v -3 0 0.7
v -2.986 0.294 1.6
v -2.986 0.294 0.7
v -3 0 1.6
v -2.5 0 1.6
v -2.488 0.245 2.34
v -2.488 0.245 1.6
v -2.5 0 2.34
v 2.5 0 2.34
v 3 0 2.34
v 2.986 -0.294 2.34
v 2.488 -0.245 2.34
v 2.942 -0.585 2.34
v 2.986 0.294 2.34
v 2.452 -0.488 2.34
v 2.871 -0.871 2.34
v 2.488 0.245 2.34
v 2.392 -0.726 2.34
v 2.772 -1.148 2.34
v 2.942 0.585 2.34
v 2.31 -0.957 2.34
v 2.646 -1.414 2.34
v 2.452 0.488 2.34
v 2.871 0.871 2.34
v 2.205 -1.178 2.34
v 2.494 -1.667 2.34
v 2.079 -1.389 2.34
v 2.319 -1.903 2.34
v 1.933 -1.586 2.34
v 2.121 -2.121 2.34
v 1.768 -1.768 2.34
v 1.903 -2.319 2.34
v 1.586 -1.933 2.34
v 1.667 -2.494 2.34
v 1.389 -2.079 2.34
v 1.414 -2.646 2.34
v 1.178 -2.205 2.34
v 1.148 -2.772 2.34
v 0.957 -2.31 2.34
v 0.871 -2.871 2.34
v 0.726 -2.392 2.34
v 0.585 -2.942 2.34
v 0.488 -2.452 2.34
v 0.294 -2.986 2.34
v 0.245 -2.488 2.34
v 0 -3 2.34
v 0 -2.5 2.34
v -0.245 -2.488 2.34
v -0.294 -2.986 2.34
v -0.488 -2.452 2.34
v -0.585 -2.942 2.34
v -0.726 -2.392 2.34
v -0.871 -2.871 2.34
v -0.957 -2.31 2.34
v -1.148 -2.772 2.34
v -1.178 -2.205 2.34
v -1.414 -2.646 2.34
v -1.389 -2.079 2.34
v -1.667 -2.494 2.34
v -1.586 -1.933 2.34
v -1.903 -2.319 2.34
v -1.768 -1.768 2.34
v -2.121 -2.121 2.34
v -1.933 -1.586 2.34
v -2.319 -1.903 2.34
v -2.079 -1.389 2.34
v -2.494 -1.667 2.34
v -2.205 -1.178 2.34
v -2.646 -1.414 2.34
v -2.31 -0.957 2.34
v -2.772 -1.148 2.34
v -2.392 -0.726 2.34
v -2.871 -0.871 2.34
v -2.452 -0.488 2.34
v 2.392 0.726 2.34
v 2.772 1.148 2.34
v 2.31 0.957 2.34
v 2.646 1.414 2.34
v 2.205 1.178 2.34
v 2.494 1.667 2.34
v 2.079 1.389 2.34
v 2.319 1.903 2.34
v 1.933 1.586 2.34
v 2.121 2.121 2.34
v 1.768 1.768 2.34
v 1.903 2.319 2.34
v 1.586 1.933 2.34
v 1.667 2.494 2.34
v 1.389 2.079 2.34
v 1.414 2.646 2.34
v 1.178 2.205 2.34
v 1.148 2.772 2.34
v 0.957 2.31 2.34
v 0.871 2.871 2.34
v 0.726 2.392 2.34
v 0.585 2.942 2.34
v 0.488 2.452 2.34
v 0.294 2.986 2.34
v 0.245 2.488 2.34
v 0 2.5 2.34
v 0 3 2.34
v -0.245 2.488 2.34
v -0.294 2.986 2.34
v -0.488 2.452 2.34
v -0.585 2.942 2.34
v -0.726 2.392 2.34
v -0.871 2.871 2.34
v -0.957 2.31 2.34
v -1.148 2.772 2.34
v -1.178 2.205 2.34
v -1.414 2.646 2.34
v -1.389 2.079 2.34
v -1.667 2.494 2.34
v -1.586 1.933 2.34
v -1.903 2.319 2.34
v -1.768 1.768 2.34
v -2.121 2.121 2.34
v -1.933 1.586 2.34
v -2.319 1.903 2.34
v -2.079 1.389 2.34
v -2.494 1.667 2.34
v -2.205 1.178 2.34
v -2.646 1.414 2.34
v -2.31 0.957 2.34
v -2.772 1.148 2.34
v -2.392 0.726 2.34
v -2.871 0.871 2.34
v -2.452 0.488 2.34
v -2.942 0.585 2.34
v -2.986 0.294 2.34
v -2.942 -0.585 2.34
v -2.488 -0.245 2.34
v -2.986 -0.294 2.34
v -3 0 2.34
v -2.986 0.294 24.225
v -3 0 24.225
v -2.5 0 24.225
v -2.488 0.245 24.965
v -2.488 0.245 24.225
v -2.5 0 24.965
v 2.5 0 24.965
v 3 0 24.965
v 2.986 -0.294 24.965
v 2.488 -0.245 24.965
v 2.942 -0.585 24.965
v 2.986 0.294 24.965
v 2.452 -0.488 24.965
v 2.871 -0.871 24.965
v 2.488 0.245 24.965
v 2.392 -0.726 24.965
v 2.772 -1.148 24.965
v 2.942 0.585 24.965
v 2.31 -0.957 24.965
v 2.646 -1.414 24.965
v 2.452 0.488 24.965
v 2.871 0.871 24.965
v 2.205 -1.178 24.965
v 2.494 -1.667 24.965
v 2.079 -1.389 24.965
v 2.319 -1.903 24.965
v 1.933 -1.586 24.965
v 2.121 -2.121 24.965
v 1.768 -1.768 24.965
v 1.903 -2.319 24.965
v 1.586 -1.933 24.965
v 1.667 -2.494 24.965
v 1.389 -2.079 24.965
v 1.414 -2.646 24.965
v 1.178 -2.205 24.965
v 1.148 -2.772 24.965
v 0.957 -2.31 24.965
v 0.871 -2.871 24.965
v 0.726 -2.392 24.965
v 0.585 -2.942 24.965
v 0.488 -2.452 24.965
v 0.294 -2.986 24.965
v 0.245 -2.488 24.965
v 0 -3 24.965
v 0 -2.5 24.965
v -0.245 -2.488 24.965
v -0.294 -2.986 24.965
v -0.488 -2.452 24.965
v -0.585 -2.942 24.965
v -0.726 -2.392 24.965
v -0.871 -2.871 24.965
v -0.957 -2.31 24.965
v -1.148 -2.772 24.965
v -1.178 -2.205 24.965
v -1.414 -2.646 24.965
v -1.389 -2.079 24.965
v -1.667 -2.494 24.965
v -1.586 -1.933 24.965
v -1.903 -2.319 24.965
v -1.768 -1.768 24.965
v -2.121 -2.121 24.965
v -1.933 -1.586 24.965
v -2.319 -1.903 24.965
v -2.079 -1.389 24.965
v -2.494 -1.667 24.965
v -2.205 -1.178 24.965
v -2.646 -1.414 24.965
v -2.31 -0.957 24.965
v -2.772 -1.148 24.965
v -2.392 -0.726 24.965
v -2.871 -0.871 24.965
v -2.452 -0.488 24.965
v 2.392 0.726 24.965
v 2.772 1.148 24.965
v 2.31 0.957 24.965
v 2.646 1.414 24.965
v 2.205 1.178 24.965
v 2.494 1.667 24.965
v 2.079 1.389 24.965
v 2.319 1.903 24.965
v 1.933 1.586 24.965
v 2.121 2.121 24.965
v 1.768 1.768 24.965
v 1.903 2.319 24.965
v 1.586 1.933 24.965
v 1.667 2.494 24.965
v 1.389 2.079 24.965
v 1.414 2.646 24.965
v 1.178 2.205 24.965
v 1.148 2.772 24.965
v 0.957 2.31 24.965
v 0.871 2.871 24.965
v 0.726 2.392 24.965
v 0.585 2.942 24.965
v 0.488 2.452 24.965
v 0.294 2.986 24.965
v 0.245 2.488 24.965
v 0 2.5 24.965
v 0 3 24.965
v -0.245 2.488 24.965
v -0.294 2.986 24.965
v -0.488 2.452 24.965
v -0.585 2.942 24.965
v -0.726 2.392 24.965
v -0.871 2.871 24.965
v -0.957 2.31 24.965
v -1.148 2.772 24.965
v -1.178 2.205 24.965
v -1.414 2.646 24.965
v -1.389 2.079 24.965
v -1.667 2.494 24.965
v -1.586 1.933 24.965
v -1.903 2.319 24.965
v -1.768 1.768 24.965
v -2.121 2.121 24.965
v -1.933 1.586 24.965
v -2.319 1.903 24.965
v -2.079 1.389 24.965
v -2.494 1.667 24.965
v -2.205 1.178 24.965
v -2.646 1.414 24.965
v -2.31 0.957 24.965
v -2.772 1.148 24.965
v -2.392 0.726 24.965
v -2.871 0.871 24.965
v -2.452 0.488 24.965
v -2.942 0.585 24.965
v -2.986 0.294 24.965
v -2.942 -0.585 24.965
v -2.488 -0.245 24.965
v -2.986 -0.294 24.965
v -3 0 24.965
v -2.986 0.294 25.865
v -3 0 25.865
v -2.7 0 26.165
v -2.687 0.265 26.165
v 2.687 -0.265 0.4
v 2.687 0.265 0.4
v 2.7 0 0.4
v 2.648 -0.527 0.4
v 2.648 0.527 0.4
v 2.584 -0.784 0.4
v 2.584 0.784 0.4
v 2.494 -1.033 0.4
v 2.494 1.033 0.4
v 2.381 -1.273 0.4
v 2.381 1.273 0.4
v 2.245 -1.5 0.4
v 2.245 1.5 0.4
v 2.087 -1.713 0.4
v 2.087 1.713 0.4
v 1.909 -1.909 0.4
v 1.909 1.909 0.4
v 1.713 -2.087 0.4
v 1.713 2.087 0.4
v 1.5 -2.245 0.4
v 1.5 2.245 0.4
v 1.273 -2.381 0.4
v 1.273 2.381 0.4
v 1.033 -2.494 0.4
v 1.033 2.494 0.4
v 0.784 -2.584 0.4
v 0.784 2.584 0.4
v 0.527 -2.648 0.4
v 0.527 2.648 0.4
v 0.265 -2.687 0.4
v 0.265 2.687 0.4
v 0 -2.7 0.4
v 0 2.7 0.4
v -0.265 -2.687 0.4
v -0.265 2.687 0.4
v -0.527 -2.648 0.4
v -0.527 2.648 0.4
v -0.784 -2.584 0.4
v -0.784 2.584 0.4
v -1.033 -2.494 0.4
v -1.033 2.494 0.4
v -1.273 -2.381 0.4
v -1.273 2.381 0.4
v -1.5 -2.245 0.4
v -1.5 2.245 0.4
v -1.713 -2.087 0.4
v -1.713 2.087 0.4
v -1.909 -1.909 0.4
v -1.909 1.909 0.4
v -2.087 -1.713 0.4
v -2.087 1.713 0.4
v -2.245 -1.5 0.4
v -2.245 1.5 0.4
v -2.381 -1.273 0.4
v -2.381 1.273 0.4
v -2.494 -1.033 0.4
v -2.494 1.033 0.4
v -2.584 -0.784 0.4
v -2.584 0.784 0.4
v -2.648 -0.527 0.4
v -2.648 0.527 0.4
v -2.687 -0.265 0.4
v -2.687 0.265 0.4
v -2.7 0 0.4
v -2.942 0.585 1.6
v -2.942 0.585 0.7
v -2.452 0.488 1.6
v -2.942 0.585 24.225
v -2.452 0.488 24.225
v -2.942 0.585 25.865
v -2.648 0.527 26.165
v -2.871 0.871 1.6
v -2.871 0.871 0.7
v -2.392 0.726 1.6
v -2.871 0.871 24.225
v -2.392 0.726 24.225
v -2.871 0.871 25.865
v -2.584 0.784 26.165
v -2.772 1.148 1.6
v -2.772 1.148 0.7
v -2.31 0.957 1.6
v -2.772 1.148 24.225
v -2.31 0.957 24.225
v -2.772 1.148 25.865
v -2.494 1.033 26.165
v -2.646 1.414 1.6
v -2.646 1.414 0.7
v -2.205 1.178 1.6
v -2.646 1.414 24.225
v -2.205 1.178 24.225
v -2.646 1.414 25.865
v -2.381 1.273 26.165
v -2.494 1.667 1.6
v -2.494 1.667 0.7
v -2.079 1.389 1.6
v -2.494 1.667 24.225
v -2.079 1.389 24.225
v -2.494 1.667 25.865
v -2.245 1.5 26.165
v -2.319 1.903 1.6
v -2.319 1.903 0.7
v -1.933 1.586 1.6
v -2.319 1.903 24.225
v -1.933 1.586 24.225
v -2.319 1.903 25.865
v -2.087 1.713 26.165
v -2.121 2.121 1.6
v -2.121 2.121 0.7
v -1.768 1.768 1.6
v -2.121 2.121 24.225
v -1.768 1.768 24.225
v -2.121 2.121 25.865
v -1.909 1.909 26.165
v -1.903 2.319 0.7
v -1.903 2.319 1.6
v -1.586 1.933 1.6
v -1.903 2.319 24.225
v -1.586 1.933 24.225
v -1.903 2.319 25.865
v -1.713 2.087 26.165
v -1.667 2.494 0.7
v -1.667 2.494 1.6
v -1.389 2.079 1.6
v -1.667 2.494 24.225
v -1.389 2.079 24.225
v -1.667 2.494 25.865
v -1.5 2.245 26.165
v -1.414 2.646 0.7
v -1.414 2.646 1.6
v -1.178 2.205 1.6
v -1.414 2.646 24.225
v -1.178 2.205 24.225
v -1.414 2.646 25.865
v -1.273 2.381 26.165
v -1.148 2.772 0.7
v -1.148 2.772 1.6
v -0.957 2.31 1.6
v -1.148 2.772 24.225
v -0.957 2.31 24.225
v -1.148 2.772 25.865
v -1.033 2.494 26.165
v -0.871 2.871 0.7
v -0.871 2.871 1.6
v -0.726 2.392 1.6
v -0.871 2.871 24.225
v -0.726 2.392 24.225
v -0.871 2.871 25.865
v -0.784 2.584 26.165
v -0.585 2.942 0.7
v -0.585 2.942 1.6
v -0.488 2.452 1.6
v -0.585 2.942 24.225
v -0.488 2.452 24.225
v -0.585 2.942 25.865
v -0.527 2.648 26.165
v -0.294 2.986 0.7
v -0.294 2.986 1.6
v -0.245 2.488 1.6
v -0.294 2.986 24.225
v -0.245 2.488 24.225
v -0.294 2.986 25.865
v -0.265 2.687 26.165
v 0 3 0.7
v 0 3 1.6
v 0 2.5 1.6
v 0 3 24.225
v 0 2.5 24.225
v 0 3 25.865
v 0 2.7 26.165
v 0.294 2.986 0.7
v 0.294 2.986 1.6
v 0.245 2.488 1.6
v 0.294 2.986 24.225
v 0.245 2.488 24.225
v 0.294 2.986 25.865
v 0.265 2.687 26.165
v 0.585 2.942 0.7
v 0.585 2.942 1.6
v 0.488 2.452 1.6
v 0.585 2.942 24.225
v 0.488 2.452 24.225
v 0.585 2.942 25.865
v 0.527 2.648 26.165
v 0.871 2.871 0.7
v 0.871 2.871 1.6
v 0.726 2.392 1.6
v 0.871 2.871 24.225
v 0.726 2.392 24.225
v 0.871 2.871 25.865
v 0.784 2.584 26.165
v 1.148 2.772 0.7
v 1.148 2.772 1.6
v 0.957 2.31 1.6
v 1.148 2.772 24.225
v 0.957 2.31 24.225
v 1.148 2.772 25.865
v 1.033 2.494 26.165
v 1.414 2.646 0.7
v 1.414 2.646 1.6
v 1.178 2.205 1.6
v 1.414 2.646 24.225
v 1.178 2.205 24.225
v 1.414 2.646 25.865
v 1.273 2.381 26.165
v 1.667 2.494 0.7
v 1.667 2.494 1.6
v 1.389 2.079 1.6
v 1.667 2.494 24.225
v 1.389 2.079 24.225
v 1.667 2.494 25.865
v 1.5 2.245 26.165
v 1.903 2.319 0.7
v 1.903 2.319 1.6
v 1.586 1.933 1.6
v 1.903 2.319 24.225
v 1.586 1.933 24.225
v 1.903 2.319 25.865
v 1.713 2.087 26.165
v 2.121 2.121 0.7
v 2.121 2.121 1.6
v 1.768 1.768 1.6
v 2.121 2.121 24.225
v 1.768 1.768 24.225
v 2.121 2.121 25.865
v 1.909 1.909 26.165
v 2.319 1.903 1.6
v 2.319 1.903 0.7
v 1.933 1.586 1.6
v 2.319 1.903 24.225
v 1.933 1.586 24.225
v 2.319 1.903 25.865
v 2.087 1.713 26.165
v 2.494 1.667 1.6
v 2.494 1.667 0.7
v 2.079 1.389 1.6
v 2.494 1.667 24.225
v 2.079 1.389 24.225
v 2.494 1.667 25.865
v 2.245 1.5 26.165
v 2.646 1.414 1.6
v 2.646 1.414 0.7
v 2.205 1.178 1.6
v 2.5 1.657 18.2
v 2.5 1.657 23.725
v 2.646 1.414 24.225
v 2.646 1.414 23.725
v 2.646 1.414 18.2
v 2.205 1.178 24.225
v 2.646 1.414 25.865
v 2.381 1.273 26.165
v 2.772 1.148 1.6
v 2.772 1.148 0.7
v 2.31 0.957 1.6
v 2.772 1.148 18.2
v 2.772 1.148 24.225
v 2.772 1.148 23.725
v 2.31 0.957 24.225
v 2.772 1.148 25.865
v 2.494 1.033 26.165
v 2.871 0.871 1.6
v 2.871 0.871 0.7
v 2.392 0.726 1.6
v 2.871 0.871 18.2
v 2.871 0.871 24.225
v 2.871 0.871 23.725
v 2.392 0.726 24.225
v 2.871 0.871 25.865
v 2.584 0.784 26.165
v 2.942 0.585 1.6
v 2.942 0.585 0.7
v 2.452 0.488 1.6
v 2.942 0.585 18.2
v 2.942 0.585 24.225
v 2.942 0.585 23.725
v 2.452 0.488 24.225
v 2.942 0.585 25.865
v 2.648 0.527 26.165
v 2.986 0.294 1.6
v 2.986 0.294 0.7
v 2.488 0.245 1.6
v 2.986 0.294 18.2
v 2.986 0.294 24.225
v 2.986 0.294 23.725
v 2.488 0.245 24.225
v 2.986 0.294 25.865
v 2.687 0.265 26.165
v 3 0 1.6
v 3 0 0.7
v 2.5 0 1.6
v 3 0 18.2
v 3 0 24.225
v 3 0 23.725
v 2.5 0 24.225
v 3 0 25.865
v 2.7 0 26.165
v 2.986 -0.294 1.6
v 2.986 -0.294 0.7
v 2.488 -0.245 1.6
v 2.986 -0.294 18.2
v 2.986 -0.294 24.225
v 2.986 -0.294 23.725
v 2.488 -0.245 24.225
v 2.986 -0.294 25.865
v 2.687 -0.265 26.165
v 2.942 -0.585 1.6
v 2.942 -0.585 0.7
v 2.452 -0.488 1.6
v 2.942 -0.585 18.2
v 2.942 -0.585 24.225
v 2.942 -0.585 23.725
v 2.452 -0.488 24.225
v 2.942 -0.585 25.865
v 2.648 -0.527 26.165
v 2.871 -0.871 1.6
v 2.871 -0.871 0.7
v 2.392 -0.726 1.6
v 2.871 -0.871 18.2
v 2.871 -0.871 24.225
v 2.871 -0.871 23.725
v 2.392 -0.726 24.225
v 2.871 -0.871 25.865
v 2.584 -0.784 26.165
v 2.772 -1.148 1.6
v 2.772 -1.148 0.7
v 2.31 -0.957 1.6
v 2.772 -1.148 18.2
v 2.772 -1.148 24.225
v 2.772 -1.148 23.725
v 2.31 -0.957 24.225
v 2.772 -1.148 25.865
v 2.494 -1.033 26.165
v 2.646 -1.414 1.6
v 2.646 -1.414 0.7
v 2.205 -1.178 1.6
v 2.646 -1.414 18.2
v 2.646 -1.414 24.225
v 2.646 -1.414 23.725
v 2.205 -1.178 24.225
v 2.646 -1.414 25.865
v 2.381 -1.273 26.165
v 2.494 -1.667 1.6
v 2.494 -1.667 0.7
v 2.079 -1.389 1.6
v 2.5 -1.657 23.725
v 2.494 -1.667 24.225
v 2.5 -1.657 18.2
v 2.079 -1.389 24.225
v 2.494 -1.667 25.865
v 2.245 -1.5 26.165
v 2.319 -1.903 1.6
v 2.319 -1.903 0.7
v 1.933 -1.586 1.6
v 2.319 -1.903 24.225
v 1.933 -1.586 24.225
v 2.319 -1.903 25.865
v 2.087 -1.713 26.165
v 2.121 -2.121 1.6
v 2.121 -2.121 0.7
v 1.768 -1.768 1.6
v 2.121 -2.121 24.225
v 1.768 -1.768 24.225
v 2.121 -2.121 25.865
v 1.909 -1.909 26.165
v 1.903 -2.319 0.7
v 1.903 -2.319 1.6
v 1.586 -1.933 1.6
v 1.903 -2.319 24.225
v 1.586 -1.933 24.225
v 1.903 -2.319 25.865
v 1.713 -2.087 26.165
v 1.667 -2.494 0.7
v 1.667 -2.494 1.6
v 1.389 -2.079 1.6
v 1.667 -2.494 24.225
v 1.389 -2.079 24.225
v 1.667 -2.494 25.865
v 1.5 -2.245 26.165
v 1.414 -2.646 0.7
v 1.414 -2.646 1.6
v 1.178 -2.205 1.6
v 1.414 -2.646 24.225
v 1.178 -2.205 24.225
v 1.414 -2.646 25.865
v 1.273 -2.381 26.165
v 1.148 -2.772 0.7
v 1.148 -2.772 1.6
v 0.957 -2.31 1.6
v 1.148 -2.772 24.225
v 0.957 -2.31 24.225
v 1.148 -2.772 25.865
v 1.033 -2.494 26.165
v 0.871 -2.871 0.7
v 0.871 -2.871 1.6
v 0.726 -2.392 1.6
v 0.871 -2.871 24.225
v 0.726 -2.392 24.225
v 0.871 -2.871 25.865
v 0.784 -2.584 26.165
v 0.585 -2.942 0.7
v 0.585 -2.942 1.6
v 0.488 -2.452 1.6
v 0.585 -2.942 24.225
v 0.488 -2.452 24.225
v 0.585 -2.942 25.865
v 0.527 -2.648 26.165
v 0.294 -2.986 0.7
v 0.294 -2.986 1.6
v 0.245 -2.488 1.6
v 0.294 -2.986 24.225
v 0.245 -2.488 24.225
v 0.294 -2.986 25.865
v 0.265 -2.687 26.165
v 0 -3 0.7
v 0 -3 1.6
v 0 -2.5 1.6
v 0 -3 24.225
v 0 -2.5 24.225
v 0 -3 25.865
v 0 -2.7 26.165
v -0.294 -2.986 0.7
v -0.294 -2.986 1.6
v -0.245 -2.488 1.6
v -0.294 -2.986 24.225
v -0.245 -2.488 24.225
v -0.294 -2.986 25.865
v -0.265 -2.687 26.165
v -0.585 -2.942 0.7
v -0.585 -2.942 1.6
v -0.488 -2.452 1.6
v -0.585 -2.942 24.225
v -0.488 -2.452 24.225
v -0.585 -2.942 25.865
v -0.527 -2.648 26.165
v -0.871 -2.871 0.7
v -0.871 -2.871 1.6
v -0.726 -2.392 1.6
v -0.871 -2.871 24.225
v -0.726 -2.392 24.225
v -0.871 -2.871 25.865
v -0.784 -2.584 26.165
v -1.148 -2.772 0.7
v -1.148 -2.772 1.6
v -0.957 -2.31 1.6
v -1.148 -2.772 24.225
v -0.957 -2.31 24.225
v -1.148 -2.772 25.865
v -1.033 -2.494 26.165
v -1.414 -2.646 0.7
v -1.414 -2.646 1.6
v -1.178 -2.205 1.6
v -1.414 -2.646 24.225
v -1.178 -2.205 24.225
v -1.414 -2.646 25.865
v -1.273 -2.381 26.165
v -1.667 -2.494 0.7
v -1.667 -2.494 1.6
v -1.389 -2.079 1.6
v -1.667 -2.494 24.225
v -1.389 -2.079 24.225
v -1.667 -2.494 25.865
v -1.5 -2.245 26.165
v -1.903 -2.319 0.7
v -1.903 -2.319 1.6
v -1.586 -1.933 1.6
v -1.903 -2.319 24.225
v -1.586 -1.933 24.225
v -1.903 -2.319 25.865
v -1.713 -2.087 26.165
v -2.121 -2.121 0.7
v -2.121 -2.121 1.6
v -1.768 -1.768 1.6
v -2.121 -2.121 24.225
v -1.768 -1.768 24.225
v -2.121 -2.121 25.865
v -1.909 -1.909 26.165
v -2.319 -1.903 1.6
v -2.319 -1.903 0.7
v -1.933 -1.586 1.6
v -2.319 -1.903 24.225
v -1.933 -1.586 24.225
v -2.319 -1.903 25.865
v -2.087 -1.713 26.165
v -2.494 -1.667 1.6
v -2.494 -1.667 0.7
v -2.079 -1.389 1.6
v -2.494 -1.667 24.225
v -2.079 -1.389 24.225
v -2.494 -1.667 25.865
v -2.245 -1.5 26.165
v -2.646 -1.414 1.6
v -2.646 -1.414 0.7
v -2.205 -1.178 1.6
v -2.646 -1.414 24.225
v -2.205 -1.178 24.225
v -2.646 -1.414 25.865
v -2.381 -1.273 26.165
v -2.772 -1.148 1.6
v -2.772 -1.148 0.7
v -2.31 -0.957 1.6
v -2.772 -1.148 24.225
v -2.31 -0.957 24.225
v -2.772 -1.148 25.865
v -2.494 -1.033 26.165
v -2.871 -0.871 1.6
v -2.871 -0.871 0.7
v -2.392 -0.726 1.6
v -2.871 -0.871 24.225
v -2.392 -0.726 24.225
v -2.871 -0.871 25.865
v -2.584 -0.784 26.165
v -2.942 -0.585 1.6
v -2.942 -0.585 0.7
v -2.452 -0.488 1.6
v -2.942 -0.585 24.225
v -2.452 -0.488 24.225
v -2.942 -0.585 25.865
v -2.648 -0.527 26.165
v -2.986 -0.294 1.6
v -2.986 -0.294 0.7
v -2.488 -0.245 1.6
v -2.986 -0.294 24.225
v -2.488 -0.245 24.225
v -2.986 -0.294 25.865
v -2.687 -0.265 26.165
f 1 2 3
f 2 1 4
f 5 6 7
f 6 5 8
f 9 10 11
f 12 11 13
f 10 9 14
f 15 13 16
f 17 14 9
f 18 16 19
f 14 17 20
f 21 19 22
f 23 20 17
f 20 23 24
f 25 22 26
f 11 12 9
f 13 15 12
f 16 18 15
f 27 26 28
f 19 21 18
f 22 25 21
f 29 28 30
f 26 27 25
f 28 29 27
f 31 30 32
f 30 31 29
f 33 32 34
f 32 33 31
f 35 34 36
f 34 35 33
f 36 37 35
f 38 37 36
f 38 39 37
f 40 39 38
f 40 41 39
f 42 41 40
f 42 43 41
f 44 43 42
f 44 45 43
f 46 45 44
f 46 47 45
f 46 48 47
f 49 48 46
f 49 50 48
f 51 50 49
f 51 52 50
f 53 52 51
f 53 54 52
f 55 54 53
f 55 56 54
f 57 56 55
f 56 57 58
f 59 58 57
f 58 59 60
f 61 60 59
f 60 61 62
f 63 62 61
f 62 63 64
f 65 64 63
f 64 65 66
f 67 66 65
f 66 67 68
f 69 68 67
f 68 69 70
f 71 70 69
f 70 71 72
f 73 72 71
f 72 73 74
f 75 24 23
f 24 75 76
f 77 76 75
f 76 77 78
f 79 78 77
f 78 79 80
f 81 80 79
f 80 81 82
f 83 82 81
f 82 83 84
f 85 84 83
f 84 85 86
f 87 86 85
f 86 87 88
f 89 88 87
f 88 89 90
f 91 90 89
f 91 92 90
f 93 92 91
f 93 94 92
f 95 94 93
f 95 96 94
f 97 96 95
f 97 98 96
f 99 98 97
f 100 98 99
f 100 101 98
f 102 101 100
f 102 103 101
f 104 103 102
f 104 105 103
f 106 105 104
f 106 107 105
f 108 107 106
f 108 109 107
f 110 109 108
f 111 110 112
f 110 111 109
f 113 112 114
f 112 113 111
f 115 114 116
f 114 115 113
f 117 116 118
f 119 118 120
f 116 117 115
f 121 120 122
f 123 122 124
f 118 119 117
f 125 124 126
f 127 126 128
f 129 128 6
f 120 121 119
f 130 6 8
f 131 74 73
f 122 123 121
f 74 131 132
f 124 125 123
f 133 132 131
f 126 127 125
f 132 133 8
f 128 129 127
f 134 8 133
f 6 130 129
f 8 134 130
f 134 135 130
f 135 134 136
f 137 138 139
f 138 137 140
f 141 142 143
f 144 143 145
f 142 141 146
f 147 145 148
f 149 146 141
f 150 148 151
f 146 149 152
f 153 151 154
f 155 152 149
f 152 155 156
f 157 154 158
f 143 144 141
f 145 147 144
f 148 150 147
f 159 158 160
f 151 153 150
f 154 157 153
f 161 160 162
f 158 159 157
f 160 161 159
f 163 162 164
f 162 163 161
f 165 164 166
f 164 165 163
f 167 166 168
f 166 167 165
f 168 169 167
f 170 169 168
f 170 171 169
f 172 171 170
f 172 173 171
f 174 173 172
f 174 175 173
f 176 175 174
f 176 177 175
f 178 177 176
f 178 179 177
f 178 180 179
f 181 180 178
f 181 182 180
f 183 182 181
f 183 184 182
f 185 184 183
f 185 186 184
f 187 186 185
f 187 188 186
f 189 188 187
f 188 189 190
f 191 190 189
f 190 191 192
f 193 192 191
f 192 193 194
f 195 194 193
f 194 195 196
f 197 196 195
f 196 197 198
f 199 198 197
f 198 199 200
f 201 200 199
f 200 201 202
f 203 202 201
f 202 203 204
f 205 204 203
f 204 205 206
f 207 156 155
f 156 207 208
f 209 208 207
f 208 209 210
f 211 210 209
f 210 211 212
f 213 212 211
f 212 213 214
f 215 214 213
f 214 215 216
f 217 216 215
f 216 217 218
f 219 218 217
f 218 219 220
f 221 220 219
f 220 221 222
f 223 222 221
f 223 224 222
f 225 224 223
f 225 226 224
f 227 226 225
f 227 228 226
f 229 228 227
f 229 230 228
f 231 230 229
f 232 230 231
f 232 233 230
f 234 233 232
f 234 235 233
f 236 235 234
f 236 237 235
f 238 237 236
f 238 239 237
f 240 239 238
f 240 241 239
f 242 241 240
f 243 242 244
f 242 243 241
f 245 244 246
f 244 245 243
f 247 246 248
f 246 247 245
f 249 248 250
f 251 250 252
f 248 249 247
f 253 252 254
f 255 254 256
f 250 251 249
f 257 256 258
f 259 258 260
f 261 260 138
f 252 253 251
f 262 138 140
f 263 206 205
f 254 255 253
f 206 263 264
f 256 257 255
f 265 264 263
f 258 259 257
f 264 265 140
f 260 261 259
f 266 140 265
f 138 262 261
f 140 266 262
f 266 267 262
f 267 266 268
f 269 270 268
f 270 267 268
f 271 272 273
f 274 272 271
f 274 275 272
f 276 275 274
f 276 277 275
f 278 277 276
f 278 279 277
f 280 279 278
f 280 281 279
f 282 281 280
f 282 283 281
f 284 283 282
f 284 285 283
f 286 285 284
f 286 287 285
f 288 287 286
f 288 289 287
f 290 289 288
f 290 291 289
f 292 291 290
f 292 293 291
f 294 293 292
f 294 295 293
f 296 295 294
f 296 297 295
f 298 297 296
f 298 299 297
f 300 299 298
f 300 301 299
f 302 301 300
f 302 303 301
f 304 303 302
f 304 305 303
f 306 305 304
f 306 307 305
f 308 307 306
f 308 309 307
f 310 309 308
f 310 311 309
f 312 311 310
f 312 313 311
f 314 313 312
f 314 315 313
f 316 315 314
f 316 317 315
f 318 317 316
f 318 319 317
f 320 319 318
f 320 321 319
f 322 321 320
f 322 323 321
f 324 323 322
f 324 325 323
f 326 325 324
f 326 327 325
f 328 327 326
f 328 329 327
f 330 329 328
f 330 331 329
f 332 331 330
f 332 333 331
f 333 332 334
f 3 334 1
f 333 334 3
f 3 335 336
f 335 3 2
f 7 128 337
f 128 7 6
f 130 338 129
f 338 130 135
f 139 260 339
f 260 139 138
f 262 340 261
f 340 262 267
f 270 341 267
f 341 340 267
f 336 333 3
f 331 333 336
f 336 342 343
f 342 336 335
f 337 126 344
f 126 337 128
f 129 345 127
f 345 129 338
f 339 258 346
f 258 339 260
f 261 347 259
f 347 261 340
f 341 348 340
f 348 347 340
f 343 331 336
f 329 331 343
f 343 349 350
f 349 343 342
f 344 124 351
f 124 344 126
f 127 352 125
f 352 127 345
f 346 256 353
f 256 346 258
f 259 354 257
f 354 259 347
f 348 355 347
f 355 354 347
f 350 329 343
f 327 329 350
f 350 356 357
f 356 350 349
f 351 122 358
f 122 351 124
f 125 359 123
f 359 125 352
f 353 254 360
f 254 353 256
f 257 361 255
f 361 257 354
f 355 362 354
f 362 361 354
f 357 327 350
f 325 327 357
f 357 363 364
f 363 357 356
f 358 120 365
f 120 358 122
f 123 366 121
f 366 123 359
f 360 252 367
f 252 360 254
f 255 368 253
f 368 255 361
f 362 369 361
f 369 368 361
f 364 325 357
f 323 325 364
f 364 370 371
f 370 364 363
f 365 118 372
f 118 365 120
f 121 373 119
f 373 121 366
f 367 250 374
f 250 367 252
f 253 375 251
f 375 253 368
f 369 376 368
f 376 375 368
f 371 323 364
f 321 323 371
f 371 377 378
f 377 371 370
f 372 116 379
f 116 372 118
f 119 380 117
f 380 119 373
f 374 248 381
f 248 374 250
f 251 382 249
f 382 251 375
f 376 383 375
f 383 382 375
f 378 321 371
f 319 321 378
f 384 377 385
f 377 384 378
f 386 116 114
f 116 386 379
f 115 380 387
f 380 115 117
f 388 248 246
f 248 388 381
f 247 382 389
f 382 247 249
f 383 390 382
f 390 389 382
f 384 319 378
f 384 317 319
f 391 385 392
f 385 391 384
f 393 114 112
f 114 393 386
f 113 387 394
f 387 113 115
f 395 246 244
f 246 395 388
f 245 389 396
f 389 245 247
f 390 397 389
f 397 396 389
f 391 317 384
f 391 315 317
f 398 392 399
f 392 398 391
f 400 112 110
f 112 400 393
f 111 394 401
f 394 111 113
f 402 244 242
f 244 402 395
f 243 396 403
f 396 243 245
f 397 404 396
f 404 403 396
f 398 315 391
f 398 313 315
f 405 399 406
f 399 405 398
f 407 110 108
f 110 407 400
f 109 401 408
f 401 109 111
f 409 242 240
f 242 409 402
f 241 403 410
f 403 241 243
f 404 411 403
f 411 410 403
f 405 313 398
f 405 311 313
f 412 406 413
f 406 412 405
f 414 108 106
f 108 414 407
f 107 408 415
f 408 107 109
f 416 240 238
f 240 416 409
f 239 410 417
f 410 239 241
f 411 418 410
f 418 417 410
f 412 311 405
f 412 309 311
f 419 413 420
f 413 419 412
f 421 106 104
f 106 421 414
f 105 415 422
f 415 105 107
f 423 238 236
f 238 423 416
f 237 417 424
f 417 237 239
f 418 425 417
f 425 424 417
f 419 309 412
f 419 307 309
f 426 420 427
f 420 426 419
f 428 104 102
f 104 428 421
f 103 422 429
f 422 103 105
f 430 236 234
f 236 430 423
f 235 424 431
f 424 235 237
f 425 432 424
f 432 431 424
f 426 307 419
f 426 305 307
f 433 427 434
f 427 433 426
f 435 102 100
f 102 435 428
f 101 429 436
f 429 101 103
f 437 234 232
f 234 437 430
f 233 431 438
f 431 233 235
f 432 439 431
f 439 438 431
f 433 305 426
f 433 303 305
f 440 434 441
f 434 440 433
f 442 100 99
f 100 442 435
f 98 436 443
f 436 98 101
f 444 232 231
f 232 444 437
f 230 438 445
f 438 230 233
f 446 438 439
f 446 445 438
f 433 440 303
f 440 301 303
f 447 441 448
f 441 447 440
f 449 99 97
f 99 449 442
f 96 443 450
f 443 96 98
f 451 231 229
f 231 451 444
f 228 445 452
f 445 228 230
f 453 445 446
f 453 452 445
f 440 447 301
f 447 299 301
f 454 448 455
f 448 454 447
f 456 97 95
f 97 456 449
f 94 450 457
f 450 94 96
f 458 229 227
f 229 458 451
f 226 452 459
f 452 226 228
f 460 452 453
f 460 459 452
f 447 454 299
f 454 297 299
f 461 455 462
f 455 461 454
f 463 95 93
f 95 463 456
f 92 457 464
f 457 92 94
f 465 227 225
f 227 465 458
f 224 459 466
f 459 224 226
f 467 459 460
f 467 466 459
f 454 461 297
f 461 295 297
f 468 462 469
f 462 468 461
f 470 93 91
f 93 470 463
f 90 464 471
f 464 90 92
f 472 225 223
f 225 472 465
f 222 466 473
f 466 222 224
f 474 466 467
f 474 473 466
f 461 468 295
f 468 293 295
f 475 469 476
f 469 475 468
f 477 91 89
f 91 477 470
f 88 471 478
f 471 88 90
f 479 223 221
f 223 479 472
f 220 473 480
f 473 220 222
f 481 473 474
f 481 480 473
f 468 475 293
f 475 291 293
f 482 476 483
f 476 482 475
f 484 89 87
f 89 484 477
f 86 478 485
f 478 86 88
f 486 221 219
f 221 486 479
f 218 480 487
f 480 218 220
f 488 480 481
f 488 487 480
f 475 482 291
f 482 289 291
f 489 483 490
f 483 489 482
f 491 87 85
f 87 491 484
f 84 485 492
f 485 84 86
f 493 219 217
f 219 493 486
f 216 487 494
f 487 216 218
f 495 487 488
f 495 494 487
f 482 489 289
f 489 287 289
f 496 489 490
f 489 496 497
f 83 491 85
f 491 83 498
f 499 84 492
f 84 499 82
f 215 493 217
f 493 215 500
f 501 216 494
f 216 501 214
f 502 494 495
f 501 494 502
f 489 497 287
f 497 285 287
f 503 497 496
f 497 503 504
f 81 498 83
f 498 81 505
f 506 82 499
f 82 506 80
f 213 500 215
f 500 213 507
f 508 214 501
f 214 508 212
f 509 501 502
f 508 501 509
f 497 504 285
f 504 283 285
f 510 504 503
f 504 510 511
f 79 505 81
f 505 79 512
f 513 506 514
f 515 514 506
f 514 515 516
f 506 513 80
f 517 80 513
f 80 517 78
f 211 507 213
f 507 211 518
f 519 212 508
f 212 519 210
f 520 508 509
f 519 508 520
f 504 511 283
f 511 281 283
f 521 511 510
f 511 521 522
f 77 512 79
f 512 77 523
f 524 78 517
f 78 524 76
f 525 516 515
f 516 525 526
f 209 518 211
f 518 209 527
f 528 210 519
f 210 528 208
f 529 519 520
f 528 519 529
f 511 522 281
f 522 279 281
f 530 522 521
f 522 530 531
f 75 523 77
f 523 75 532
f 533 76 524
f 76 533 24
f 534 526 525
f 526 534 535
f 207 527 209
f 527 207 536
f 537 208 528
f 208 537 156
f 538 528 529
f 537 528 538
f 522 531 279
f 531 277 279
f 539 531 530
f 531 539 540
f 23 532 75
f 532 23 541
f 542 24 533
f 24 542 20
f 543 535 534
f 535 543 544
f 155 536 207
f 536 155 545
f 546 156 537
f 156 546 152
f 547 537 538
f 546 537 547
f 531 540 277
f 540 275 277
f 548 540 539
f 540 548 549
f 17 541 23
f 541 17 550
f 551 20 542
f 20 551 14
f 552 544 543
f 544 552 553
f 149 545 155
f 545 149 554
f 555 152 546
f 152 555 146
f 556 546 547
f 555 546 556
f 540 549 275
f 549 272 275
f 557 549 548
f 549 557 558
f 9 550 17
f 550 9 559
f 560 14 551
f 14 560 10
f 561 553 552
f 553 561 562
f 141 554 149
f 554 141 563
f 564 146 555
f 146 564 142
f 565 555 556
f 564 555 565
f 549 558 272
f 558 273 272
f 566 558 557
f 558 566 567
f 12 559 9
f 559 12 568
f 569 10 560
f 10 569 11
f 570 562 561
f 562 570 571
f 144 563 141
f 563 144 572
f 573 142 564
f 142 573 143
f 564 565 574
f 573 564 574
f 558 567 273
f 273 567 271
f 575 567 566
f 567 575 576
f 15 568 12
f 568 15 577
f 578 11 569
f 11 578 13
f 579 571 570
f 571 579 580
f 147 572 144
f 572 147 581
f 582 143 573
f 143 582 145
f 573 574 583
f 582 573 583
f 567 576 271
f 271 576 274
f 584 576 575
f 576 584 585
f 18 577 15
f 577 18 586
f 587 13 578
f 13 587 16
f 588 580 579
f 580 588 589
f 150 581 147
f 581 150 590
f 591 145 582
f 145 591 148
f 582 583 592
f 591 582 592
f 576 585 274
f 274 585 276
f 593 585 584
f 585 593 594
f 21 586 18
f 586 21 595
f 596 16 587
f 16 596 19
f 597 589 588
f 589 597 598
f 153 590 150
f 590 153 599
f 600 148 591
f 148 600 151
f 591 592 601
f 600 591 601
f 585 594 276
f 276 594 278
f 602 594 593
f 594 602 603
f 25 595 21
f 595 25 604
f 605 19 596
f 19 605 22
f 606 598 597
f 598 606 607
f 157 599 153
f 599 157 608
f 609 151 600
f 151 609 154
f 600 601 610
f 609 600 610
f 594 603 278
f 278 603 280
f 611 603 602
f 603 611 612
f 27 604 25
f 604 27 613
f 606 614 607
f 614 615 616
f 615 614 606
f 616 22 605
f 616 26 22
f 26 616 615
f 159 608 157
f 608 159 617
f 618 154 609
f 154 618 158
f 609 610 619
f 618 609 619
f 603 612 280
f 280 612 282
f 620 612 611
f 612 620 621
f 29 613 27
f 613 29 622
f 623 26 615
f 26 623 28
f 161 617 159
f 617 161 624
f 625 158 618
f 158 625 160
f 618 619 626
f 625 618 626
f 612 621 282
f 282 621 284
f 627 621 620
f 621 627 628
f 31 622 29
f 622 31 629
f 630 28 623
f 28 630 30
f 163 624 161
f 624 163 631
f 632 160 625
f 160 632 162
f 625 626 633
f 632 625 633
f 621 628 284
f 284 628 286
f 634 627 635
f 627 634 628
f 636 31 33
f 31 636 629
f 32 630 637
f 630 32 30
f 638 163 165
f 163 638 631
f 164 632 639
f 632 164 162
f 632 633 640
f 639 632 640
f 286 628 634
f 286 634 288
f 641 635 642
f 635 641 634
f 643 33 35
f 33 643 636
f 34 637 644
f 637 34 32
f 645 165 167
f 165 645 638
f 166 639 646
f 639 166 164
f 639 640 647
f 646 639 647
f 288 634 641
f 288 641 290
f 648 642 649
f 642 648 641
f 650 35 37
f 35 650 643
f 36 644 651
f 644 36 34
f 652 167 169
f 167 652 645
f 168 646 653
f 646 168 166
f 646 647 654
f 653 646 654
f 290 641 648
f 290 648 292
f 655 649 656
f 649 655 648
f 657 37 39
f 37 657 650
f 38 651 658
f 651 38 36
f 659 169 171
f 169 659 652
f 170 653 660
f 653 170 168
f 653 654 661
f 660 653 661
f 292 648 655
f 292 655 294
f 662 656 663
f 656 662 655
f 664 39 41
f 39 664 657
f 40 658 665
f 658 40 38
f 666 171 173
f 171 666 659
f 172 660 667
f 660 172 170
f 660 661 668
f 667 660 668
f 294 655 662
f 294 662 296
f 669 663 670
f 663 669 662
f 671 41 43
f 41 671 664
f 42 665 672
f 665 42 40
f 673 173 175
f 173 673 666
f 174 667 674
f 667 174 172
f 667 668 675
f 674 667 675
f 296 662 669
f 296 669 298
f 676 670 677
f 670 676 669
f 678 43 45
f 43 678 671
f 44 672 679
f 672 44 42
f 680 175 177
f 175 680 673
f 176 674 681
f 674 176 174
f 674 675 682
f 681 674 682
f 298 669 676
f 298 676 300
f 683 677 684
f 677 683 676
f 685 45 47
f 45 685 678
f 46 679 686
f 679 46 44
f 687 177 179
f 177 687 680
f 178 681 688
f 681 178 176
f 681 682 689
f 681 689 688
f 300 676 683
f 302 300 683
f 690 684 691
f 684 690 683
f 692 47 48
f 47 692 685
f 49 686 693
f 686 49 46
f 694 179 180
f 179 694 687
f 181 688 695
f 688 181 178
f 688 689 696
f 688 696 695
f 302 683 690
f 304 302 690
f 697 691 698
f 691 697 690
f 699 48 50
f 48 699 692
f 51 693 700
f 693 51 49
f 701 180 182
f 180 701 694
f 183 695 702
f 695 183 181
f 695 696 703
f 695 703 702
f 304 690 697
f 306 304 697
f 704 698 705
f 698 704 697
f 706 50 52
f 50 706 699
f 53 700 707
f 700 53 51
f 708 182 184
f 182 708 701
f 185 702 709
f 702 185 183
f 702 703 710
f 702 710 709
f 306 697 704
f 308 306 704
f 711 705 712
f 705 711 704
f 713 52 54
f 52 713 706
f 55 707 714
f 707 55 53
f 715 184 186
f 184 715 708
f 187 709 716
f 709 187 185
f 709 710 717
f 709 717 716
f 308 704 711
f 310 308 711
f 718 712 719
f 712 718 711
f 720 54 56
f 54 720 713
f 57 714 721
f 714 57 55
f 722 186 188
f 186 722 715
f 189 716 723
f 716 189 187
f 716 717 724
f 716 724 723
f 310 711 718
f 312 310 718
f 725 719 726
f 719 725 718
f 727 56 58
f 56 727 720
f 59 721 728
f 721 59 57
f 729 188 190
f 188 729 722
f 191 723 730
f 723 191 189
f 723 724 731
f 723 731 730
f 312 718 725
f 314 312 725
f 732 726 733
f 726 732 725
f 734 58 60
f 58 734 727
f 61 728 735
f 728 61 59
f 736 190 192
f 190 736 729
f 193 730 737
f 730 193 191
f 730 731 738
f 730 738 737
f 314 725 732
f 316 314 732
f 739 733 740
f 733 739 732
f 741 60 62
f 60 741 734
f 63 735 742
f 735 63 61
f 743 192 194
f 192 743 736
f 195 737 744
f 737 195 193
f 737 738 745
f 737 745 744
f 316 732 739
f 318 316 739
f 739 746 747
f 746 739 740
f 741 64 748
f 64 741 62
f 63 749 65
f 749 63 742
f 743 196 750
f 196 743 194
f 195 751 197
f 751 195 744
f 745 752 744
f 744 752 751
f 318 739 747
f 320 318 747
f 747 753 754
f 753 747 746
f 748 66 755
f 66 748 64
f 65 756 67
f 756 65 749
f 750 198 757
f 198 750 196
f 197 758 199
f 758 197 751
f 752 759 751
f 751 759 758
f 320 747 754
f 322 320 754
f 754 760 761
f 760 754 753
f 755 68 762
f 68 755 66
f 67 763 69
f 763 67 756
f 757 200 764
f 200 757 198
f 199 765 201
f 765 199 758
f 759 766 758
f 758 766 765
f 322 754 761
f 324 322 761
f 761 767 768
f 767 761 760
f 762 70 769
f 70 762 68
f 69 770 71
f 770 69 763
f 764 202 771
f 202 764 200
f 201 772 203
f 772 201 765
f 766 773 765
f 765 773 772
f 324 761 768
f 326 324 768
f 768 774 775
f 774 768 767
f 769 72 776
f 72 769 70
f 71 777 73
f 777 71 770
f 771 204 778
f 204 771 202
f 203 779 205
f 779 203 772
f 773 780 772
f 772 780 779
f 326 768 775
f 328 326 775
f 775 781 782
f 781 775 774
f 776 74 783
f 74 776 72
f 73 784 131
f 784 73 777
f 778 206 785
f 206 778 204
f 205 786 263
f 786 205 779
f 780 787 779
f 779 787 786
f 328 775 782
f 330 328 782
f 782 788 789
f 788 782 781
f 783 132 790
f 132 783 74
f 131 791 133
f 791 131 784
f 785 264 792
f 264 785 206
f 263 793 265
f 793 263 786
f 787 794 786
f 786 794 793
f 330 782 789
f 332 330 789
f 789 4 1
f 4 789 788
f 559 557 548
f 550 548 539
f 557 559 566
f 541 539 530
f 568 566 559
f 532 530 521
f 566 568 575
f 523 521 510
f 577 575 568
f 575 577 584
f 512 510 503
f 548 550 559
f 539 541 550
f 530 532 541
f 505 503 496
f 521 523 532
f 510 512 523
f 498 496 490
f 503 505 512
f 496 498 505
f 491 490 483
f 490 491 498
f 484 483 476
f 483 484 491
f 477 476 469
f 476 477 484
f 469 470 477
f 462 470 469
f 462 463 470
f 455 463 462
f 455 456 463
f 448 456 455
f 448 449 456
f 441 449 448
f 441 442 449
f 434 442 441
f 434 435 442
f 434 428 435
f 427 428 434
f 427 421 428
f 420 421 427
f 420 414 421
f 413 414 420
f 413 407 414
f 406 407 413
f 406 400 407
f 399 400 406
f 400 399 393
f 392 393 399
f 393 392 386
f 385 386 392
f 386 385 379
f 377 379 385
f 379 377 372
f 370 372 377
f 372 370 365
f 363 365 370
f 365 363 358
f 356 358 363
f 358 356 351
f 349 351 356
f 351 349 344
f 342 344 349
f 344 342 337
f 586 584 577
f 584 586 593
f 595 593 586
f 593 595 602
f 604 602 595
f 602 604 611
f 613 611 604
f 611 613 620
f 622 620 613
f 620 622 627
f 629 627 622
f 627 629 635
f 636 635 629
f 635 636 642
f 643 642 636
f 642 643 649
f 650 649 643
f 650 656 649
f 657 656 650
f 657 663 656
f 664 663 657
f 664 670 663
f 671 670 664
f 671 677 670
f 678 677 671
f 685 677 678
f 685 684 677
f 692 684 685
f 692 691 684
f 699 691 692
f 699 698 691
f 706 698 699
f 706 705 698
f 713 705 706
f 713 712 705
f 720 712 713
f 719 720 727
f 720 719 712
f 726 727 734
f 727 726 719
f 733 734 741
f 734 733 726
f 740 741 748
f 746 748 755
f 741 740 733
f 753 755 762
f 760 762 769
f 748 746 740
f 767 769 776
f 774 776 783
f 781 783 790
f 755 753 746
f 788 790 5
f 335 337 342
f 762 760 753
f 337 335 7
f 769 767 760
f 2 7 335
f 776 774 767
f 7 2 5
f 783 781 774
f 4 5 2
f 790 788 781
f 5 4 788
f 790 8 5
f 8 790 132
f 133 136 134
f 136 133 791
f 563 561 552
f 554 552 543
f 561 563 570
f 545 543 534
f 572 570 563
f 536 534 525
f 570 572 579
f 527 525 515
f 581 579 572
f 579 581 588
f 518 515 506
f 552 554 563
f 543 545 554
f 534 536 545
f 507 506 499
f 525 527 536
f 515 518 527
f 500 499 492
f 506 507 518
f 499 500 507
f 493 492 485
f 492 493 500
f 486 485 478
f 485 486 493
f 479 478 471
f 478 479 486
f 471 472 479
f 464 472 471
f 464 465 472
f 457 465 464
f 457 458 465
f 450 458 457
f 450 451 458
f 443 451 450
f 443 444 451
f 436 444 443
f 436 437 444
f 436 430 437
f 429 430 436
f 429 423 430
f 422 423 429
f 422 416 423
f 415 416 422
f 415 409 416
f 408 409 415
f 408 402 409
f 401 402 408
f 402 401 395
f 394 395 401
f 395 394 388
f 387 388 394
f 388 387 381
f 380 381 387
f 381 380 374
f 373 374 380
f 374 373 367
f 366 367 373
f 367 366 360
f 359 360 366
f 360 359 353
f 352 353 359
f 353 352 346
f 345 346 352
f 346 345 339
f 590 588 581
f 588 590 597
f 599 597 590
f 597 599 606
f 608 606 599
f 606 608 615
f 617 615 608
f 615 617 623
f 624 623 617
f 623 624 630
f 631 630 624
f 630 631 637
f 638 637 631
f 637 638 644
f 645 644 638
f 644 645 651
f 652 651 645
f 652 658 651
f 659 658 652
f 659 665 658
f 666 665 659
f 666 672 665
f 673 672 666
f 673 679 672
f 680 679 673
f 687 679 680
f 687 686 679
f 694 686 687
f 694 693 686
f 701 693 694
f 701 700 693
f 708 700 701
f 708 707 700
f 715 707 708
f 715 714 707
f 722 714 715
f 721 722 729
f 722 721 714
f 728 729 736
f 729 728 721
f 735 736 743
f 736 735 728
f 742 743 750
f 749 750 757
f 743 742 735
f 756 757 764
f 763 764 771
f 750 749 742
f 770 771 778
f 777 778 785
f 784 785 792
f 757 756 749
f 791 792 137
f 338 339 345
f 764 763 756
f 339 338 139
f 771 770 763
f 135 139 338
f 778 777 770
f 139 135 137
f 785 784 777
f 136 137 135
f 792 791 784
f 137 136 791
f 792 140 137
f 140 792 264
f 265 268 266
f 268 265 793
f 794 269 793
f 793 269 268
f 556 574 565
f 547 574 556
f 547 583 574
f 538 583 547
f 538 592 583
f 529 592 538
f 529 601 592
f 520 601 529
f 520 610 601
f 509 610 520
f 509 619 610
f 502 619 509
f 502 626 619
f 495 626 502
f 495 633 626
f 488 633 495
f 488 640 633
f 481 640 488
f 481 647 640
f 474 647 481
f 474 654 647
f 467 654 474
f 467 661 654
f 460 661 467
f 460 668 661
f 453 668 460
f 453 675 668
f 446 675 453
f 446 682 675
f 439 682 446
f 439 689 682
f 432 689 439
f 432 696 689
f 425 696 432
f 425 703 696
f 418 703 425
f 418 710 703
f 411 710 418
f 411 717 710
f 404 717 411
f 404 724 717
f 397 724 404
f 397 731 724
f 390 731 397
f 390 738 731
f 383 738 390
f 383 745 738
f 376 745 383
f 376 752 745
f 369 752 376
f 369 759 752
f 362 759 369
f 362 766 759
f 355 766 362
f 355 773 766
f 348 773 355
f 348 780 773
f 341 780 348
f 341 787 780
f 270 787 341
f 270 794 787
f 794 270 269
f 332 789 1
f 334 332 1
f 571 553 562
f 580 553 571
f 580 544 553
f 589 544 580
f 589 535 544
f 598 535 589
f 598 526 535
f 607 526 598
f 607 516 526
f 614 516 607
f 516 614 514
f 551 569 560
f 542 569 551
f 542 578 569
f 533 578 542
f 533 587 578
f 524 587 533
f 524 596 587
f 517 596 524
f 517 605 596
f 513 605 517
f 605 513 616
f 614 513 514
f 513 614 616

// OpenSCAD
// DS-D · eje (M6). Generado por motor/fabricacion/gen_cad.py
include <ds_d_motor_params.scad>
include <motor_lib.scad>
shaft_part();
